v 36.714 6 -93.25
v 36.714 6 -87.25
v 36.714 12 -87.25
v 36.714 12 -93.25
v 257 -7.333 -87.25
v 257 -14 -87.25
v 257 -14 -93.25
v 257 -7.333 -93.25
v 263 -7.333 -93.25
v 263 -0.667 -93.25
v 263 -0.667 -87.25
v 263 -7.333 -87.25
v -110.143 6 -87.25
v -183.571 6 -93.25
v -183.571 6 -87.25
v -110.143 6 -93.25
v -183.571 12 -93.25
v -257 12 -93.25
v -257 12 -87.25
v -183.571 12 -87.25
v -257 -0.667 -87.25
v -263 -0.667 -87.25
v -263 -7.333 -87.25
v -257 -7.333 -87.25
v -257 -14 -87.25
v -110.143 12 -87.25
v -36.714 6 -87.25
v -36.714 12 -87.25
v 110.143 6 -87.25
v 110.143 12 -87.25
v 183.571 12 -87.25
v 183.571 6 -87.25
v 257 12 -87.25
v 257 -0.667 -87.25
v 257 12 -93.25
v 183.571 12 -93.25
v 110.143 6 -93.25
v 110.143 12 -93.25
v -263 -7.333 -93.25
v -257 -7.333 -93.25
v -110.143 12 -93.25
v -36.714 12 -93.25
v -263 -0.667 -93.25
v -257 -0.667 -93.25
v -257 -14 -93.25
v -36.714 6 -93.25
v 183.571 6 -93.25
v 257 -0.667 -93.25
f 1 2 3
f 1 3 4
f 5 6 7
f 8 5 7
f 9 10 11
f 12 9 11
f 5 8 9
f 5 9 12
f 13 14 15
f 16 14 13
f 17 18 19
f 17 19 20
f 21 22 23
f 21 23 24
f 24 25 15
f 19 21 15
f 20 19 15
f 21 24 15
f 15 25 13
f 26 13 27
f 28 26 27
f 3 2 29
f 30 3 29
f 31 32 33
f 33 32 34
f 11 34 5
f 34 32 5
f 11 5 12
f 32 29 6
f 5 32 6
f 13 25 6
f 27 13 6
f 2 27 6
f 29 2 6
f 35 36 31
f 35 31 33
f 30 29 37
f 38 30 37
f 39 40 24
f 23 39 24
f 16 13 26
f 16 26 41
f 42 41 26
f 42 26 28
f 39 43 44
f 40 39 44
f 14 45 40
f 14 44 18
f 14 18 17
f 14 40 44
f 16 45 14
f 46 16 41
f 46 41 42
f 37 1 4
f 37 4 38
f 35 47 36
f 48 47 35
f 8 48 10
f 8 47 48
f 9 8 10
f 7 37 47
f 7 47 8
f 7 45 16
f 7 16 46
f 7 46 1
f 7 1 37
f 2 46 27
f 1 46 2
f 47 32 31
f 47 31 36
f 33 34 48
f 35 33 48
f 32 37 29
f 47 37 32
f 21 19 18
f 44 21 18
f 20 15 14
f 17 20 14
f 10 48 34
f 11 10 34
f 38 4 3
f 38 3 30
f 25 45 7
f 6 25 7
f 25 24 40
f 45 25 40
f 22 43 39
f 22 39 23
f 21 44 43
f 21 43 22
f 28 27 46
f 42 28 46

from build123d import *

# Parameters (mm, degrees)
SKETCH1_W               = 466
SKETCH1_H               = 126.5
BOSS_EXTRUDE1_DEPTH     = 6
SKETCH2_W               = 73.428571429
SKETCH2_H               = 6
SKETCH2_W_2             = 73.428571428
BOSS_EXTRUDE2_DEPTH     = 20
SKETCH1_2_W             = 466
SKETCH1_2_H             = 126.5
CUT_EXTRUDE1_DEPTH      = 7
CUT_EXTRUDE1_DEPTH_BACK = 15
SKETCH2_4_W             = 73.428571429
SKETCH2_4_H             = 6
BOSS_EXTRUDE3_DEPTH     = 6
SKETCH4_W               = 6
SKETCH4_H               = 6.666666666
BOSS_EXTRUDE4_DEPTH     = 6


with BuildPart() as part:
    # Sketch1 → Boss-Extrude1 (new body)
    with BuildSketch(Plane(origin=(0, 0, 0), x_dir=(1, 0, 0), z_dir=(0, 1, 0))):
        Rectangle(SKETCH1_W, SKETCH1_H)
    extrude(amount=BOSS_EXTRUDE1_DEPTH)

    # Sketch1<2> → Cut-Extrude1 (cut, two sides)
    with BuildSketch(Plane(origin=(0, 0, 0), x_dir=(1, 0, 0), z_dir=(0, 1, 0))) as cut_extrude1_sk:
        Rectangle(SKETCH1_2_W, SKETCH1_2_H)
    extrude(amount=CUT_EXTRUDE1_DEPTH, mode=Mode.SUBTRACT)
    extrude(cut_extrude1_sk.sketch, amount=-CUT_EXTRUDE1_DEPTH_BACK, mode=Mode.SUBTRACT)


with BuildPart() as body_2:
    # Sketch2 → Boss-Extrude2 (new body)
    with BuildSketch(Plane(origin=(0, 6, 0), x_dir=(1, 0, 0), z_dir=(0, 1, 0))):
        with Locations((-220.285714286, 90.25)):
            Rectangle(SKETCH2_W, SKETCH2_H)
        with Locations((-146.857142857, 90.25)):
            Rectangle(SKETCH2_W_2, SKETCH2_H)
        with Locations((-73.428571428, 90.25)):
            Rectangle(SKETCH2_W, SKETCH2_H)
        with Locations((0, 90.25)):
            Rectangle(SKETCH2_W_2, SKETCH2_H)
        with Locations((73.428571428, 90.25)):
            Rectangle(SKETCH2_W, SKETCH2_H)
        with Locations((146.857142857, 90.25)):
            Rectangle(SKETCH2_W_2, SKETCH2_H)
        with Locations((220.285714286, 90.25)):
            Rectangle(SKETCH2_W, SKETCH2_H)
    extrude(amount=-BOSS_EXTRUDE2_DEPTH)

    # Sketch2<4> → Boss-Extrude3 (add)
    with BuildSketch(Plane(origin=(0, 6, 0), x_dir=(1, 0, 0), z_dir=(0, 1, 0))):
        with Locations((220.285714286, 90.25)):
            Rectangle(SKETCH2_4_W, SKETCH2_4_H)
        with Locations((73.428571428, 90.25)):
            Rectangle(SKETCH2_4_W, SKETCH2_4_H)
        with Locations((-73.428571428, 90.25)):
            Rectangle(SKETCH2_4_W, SKETCH2_4_H)
        with Locations((-220.285714286, 90.25)):
            Rectangle(SKETCH2_4_W, SKETCH2_4_H)
    extrude(amount=BOSS_EXTRUDE3_DEPTH)

    # Sketch4 → Boss-Extrude4 (add)
    with BuildSketch(Plane.ZY.offset(257)):
        with Locations((-90.25, -4)):
            Rectangle(SKETCH4_W, SKETCH4_H)
    boss_extrude4 = extrude(amount=BOSS_EXTRUDE4_DEPTH)

    # Mirror2: Boss-Extrude4 across plane
    add(boss_extrude4.mirror(Plane(origin=(0, 0, 0), x_dir=(0, 0, 1), z_dir=(1, 0, 0))))


solid = body_2.part
